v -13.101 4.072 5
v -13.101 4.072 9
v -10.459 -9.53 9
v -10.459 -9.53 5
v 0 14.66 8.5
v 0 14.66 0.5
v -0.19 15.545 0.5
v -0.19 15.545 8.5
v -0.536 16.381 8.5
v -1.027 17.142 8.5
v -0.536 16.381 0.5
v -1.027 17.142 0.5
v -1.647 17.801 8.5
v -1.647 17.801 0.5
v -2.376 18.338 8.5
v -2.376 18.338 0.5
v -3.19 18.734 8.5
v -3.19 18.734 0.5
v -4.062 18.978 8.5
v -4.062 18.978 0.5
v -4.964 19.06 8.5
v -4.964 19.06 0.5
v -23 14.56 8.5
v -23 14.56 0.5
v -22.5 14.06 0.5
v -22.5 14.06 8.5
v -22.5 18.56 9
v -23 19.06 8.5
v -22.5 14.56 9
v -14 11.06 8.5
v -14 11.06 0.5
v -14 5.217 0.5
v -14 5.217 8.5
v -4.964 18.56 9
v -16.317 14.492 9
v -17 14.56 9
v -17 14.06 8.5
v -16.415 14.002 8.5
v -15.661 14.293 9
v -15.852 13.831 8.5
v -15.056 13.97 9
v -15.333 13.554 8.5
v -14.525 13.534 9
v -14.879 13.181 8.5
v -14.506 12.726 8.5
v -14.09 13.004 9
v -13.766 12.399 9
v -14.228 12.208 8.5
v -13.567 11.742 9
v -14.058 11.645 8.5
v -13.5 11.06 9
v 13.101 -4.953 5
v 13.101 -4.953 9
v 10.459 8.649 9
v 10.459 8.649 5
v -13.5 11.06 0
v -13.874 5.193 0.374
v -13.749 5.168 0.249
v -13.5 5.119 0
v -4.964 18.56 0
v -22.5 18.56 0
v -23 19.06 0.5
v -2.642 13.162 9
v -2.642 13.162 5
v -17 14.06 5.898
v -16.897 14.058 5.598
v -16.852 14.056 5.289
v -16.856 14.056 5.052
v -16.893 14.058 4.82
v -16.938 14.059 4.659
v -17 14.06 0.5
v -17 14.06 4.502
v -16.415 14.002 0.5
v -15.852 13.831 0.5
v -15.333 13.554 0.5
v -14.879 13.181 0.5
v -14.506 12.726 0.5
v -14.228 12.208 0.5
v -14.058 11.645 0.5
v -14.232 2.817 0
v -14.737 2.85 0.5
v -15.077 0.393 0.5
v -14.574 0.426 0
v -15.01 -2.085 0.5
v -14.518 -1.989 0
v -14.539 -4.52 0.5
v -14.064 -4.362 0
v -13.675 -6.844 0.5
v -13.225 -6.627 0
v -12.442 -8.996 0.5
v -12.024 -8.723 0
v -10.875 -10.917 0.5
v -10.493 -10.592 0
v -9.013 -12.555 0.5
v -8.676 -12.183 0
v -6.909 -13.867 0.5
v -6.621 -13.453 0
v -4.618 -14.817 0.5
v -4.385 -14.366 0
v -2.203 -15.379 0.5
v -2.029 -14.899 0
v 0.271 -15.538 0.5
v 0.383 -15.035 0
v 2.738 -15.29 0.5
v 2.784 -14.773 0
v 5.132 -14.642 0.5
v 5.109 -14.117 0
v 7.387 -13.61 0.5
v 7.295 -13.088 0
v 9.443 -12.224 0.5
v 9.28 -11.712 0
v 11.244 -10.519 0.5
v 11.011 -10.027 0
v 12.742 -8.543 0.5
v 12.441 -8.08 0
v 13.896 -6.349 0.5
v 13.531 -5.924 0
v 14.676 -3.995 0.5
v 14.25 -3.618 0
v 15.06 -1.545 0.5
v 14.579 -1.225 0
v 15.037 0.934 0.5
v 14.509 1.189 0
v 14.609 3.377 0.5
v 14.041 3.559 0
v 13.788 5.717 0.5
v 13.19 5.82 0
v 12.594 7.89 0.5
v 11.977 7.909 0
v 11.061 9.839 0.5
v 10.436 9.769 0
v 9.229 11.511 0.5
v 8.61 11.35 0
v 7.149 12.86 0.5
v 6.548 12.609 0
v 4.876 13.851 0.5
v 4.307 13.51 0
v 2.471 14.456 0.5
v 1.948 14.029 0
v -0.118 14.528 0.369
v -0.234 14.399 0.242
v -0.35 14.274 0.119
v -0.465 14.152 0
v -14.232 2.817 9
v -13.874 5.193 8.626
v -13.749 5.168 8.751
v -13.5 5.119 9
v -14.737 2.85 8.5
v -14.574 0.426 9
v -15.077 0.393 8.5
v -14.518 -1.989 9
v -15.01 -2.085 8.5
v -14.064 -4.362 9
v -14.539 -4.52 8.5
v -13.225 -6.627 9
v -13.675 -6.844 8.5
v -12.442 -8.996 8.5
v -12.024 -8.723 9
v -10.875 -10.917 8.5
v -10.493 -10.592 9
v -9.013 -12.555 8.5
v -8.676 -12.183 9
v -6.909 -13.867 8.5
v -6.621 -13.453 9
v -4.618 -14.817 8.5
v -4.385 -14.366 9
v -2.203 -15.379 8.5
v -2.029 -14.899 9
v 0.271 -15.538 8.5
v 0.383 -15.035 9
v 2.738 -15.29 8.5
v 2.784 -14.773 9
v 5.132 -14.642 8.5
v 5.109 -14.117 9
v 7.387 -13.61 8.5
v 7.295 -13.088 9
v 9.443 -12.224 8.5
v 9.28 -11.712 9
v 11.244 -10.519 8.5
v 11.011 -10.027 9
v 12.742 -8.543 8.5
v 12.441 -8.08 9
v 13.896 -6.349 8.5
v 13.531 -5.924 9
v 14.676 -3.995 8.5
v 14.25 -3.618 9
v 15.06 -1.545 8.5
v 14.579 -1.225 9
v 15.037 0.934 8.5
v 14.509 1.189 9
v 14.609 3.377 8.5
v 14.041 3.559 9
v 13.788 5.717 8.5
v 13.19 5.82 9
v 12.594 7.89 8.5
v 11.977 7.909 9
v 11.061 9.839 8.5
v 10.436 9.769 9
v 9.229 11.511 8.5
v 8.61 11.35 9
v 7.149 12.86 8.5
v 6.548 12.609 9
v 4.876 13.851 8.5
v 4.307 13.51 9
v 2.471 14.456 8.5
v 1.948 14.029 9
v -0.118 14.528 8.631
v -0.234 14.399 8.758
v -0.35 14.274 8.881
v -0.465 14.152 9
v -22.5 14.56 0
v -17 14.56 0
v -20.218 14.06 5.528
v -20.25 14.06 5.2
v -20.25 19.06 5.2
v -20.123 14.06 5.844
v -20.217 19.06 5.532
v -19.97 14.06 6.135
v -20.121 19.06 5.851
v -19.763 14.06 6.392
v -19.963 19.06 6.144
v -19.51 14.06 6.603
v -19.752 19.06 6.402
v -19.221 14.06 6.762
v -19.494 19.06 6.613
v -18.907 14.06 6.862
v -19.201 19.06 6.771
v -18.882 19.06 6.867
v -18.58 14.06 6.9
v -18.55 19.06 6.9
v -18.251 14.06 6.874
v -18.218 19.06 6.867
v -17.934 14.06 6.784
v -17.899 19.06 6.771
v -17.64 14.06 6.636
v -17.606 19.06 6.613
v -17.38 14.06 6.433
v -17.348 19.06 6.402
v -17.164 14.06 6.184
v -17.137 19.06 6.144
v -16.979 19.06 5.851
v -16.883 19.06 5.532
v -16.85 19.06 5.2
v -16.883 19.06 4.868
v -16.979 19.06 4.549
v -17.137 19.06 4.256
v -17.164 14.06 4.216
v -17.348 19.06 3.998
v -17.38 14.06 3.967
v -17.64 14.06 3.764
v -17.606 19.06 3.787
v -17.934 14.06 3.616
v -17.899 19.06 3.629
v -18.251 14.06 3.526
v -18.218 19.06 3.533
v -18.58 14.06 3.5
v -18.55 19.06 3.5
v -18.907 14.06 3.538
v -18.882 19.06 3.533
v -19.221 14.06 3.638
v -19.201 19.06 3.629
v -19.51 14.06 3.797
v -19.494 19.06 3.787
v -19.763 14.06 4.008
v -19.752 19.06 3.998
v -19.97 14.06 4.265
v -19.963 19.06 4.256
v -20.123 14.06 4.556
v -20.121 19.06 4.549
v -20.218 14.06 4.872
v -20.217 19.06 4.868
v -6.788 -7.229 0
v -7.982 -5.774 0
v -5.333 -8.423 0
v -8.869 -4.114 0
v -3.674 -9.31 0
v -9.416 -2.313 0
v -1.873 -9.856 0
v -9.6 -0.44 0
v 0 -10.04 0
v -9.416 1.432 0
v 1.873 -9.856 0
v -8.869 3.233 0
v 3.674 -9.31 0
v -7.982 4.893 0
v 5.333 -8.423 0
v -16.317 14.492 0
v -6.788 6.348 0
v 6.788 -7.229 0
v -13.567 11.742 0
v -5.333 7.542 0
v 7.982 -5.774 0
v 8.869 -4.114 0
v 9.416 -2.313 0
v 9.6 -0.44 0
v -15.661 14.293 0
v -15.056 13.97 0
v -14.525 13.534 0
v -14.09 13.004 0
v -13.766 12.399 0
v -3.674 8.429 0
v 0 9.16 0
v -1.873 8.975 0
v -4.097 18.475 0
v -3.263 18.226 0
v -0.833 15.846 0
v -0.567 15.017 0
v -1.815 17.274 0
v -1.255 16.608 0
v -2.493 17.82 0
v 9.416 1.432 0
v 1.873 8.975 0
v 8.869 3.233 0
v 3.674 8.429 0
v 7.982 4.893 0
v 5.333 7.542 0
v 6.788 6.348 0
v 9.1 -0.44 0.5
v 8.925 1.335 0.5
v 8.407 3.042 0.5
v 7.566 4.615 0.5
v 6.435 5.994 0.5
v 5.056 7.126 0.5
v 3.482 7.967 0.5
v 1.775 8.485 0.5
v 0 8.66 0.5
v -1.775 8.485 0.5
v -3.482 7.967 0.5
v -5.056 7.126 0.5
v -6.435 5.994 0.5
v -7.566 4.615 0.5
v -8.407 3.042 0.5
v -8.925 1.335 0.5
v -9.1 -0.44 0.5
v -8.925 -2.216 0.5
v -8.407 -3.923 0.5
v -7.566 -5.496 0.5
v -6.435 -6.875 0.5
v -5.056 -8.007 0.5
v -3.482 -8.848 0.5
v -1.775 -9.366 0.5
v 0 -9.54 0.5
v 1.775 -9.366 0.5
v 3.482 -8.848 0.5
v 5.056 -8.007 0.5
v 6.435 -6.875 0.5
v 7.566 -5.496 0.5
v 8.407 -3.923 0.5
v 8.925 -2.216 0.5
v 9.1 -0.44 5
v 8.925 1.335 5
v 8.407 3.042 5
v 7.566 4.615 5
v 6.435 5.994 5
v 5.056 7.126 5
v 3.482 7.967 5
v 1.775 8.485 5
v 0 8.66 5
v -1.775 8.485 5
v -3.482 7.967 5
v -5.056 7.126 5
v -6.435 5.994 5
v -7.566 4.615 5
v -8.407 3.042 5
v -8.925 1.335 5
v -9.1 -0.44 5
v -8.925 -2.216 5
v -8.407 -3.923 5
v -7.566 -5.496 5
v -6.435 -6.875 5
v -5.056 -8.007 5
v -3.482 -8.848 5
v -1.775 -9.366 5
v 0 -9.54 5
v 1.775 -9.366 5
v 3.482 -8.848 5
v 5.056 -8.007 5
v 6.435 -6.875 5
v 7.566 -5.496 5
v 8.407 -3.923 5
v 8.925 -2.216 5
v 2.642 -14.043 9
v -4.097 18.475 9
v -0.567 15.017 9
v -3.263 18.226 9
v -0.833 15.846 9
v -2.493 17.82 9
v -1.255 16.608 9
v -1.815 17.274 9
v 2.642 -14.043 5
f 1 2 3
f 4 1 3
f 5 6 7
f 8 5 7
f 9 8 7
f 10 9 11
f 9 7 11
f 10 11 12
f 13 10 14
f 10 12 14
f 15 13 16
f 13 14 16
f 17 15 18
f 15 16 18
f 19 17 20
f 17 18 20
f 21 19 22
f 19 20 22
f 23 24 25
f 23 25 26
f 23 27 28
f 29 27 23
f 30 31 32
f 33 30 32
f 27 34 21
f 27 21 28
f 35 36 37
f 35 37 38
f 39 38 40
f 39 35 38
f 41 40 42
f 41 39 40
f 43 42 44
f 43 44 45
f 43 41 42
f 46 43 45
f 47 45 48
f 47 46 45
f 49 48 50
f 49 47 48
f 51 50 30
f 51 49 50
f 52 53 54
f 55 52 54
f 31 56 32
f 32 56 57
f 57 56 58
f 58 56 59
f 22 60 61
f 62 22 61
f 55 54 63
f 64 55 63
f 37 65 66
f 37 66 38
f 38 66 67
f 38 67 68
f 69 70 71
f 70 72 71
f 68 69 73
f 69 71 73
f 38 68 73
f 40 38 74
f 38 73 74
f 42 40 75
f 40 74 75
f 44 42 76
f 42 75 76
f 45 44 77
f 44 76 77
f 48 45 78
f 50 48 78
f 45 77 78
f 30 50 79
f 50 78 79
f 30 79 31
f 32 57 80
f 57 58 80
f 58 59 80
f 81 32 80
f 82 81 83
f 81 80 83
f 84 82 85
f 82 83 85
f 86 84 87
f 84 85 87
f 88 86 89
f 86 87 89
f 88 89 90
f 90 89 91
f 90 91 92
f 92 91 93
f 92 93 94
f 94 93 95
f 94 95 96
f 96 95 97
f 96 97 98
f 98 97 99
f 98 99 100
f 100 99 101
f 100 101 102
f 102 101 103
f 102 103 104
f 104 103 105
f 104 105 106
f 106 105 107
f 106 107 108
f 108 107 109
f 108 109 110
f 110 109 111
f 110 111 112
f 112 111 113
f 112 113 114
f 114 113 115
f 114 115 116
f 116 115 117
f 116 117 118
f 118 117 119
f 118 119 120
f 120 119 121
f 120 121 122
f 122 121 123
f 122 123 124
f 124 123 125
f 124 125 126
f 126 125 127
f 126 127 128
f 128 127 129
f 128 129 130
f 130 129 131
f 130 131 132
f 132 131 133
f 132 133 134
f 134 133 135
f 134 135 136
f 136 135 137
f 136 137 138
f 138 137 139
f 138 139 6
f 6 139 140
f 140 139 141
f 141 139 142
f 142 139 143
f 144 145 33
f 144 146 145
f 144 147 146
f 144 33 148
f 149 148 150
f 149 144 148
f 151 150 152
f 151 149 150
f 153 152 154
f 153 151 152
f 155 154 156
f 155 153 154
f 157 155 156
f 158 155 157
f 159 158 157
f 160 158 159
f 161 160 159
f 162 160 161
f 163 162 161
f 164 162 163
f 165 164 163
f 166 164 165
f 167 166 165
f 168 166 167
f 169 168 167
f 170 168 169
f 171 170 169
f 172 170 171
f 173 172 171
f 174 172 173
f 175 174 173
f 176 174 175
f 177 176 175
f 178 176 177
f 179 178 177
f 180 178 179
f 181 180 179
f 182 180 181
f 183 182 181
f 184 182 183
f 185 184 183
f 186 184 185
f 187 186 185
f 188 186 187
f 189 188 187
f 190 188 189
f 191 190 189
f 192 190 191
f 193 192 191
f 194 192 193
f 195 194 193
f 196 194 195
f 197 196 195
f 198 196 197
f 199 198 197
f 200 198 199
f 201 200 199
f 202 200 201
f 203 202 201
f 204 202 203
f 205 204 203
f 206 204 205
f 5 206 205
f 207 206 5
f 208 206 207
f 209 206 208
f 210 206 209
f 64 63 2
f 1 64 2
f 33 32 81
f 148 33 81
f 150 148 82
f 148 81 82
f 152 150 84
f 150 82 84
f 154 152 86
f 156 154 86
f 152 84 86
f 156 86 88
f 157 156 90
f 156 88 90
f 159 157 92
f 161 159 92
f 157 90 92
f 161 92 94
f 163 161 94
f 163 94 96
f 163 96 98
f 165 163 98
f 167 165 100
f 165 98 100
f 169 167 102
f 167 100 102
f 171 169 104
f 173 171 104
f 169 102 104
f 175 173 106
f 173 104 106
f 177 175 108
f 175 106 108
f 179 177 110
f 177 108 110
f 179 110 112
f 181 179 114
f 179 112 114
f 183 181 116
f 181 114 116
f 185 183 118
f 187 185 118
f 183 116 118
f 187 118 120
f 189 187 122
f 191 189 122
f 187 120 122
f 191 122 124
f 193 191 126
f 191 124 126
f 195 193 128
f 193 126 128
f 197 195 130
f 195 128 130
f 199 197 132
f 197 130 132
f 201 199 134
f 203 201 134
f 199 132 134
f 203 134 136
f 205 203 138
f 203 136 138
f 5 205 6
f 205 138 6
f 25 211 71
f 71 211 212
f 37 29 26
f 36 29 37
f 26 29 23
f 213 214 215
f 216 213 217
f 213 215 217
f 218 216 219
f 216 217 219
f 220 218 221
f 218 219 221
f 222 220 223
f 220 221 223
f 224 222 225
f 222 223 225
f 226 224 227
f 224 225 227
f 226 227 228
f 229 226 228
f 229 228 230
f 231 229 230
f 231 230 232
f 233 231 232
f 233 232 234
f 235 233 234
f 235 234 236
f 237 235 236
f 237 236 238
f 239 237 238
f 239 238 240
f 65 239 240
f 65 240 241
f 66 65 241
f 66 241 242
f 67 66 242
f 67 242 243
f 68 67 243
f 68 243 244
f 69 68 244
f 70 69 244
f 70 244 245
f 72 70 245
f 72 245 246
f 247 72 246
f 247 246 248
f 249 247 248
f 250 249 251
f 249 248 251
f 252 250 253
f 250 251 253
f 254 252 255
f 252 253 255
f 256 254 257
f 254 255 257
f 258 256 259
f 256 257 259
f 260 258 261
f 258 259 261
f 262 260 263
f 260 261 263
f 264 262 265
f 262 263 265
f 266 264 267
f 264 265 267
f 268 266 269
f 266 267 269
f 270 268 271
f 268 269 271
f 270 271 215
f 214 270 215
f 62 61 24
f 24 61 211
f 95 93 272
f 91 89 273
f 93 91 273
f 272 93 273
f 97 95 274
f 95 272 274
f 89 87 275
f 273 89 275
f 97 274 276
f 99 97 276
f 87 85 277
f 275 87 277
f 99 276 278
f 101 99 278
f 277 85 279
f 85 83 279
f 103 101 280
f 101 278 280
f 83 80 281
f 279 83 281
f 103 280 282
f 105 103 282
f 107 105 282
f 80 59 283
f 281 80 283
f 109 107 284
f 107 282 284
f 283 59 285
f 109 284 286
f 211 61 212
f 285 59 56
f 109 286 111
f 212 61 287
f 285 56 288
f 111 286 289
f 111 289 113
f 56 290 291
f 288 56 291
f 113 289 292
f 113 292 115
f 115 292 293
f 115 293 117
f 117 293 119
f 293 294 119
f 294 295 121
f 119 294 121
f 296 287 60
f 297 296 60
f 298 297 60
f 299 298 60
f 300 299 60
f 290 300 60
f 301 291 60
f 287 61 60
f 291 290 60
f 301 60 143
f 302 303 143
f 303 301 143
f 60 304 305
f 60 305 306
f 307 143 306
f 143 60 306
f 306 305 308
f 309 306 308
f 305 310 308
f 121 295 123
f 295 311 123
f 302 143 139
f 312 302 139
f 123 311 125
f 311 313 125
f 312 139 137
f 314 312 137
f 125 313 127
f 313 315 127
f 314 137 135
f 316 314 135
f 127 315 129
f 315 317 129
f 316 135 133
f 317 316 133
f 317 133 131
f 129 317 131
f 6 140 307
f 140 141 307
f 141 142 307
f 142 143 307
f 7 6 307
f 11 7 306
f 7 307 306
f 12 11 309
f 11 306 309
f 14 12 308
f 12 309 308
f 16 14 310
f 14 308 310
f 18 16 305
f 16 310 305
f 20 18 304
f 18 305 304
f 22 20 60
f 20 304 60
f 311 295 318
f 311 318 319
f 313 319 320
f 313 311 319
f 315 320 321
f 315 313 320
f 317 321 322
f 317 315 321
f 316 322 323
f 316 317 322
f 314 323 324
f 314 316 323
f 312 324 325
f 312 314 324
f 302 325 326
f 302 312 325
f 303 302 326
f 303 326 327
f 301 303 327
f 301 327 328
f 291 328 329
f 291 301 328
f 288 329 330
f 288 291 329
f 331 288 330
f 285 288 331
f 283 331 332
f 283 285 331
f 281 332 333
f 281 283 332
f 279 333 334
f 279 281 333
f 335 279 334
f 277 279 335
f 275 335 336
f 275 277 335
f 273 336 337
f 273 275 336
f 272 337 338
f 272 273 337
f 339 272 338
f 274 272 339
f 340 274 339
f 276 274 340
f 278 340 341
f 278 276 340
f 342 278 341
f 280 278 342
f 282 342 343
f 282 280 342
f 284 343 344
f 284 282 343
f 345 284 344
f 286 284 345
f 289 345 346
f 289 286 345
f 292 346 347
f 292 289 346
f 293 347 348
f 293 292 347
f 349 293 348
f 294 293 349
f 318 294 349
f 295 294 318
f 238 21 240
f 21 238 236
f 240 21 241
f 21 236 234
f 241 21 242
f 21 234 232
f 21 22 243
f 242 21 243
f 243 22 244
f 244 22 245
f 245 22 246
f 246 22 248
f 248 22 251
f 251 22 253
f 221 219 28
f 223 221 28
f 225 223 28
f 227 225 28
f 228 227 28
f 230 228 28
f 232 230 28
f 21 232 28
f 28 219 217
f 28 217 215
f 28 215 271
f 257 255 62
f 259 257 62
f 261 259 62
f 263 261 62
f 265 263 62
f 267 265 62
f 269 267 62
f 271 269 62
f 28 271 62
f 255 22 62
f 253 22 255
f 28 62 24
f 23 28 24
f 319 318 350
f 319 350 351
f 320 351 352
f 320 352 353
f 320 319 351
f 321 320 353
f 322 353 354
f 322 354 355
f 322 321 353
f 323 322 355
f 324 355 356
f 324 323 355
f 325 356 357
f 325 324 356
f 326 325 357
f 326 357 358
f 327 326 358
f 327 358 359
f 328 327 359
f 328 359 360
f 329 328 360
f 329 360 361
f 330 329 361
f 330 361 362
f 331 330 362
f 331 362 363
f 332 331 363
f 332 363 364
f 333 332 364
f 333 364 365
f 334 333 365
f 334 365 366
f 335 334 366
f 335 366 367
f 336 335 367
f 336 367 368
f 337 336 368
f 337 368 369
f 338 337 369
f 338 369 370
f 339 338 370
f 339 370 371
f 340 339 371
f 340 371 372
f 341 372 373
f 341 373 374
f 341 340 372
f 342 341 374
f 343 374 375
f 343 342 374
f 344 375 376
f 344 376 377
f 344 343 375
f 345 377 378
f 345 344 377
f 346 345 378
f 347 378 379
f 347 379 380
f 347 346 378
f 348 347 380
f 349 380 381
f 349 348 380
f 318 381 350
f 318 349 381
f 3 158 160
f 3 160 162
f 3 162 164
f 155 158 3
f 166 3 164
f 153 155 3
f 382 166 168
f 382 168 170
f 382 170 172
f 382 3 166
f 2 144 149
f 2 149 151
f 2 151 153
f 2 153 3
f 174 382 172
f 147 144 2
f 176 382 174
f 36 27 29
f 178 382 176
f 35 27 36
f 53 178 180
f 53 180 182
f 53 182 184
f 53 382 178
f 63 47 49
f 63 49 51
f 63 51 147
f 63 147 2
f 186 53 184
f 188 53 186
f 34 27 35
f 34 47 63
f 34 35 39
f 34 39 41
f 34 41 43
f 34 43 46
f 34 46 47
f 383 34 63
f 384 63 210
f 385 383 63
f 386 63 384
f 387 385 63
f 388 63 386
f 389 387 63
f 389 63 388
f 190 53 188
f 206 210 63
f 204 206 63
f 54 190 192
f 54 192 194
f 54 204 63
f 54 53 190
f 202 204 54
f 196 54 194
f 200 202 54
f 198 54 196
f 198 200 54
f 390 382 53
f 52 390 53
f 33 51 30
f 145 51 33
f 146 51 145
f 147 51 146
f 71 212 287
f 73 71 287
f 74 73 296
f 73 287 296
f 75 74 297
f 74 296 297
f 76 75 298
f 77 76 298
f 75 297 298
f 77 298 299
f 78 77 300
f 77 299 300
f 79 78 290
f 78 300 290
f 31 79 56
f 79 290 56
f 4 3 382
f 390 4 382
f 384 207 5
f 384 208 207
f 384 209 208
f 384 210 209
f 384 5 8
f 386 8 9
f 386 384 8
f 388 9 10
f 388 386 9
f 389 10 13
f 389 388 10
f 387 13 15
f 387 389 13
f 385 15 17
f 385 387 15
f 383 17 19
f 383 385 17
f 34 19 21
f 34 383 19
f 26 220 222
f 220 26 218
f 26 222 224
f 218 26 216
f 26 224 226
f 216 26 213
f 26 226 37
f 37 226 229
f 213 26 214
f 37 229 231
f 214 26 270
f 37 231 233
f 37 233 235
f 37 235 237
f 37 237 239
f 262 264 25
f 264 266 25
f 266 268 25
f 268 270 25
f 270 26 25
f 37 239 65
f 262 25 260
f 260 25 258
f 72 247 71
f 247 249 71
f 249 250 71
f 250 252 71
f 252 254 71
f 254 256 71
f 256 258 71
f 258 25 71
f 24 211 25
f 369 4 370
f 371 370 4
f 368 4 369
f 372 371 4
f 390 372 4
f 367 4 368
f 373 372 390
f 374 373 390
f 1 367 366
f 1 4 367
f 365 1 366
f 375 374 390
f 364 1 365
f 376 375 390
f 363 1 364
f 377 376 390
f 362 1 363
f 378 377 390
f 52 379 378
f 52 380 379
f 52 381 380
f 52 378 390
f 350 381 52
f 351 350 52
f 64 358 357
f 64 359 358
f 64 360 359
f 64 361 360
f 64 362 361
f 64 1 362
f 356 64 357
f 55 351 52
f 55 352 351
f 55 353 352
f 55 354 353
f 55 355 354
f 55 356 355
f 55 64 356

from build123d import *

# Parameters (mm, degrees)
F0_R     = 9.1
F1_DEPTH = 9
F2_SIZE  = 0.5
F3_R     = 1.7
F4_DEPTH = 5.0047524467
F5_R     = 9.1
F6_DEPTH = 4


# Not quite as in the source:
# - a feature names something its author has since deleted; it is built from what else it names


with BuildPart() as f1:
    # F0 (on Top) → F1 (new body)
    with BuildSketch(Plane.XY):
        with BuildLine():
            Line((-14, 11.0595270927), (-14, 5.2172651566))
            ThreePointArc((-14, 5.2172651566), (8.443285949, -12.9592956308), (0, 14.6595270927))
            ThreePointArc((0, 14.6595270927), (-1.647244668, 17.8011844795), (-4.9638694584, 19.0595270927))
            Line((-4.9638694584, 19.0595270927), (-23, 19.0595270927))
            Line((-23, 19.0595270927), (-23, 14.0595270927))
            Line((-23, 14.0595270927), (-17, 14.0595270927))
            ThreePointArc((-17, 14.0595270927), (-14.8786796564, 13.1808474363), (-14, 11.0595270927))
        make_face()
        with Locations((0, -0.4404729073)):
            Circle(F0_R, mode=Mode.SUBTRACT)
    extrude(amount=F1_DEPTH)

    # F2
    f2_edges = [f1.edges().sort_by_distance(p)[0] for p in [
        (-23, 16.559527, 0),
        (-20, 14.059527, 0),
        (-14.87868, 13.180847, 0),
        (-14, 8.138396, 0),
        (8.443286, -12.959296, 0),
        (-1.647245, 17.801184, 0),
        (-13.981935, 19.059527, 0),
        (-9.1, -0.440473, 0),
        (8.443286, -12.959296, 9),
        (-14, 8.138396, 9),
        (-20, 14.059527, 9),
        (-14.87868, 13.180847, 9),
        (-23, 16.559527, 9),
        (-13.981935, 19.059527, 9),
        (-1.647245, 17.801184, 9),
        (-23, 14.059527, 4.5),
    ]]
    chamfer(f2_edges, length=F2_SIZE)

    # F3 (on face) → F4 (cut, through all)
    with BuildSketch(Plane(origin=(0, 19.0595270927, 0), x_dir=(-1, 0, 0), z_dir=(0, 1, 0))):
        with Locations((18.55, 5.2)):
            Circle(F3_R)
    extrude(amount=-F4_DEPTH, mode=Mode.SUBTRACT)

    # F5 (on face) → F6 (cut)
    with BuildSketch(Plane.XY.offset(9)):
        Polygon((-10.4585305038, -9.5299800281), (2.6424788226, -14.0425795703), (13.1010093265, -4.9530724494), (10.4585305038, 8.6490342136), (-2.6424788226, 13.1616337557), (-13.1010093265, 4.0721266349), align=None)
        with Locations((0, -0.4404729073)):
            Circle(F5_R, mode=Mode.SUBTRACT)
    extrude(amount=-F6_DEPTH, mode=Mode.SUBTRACT)


solid = f1.part
